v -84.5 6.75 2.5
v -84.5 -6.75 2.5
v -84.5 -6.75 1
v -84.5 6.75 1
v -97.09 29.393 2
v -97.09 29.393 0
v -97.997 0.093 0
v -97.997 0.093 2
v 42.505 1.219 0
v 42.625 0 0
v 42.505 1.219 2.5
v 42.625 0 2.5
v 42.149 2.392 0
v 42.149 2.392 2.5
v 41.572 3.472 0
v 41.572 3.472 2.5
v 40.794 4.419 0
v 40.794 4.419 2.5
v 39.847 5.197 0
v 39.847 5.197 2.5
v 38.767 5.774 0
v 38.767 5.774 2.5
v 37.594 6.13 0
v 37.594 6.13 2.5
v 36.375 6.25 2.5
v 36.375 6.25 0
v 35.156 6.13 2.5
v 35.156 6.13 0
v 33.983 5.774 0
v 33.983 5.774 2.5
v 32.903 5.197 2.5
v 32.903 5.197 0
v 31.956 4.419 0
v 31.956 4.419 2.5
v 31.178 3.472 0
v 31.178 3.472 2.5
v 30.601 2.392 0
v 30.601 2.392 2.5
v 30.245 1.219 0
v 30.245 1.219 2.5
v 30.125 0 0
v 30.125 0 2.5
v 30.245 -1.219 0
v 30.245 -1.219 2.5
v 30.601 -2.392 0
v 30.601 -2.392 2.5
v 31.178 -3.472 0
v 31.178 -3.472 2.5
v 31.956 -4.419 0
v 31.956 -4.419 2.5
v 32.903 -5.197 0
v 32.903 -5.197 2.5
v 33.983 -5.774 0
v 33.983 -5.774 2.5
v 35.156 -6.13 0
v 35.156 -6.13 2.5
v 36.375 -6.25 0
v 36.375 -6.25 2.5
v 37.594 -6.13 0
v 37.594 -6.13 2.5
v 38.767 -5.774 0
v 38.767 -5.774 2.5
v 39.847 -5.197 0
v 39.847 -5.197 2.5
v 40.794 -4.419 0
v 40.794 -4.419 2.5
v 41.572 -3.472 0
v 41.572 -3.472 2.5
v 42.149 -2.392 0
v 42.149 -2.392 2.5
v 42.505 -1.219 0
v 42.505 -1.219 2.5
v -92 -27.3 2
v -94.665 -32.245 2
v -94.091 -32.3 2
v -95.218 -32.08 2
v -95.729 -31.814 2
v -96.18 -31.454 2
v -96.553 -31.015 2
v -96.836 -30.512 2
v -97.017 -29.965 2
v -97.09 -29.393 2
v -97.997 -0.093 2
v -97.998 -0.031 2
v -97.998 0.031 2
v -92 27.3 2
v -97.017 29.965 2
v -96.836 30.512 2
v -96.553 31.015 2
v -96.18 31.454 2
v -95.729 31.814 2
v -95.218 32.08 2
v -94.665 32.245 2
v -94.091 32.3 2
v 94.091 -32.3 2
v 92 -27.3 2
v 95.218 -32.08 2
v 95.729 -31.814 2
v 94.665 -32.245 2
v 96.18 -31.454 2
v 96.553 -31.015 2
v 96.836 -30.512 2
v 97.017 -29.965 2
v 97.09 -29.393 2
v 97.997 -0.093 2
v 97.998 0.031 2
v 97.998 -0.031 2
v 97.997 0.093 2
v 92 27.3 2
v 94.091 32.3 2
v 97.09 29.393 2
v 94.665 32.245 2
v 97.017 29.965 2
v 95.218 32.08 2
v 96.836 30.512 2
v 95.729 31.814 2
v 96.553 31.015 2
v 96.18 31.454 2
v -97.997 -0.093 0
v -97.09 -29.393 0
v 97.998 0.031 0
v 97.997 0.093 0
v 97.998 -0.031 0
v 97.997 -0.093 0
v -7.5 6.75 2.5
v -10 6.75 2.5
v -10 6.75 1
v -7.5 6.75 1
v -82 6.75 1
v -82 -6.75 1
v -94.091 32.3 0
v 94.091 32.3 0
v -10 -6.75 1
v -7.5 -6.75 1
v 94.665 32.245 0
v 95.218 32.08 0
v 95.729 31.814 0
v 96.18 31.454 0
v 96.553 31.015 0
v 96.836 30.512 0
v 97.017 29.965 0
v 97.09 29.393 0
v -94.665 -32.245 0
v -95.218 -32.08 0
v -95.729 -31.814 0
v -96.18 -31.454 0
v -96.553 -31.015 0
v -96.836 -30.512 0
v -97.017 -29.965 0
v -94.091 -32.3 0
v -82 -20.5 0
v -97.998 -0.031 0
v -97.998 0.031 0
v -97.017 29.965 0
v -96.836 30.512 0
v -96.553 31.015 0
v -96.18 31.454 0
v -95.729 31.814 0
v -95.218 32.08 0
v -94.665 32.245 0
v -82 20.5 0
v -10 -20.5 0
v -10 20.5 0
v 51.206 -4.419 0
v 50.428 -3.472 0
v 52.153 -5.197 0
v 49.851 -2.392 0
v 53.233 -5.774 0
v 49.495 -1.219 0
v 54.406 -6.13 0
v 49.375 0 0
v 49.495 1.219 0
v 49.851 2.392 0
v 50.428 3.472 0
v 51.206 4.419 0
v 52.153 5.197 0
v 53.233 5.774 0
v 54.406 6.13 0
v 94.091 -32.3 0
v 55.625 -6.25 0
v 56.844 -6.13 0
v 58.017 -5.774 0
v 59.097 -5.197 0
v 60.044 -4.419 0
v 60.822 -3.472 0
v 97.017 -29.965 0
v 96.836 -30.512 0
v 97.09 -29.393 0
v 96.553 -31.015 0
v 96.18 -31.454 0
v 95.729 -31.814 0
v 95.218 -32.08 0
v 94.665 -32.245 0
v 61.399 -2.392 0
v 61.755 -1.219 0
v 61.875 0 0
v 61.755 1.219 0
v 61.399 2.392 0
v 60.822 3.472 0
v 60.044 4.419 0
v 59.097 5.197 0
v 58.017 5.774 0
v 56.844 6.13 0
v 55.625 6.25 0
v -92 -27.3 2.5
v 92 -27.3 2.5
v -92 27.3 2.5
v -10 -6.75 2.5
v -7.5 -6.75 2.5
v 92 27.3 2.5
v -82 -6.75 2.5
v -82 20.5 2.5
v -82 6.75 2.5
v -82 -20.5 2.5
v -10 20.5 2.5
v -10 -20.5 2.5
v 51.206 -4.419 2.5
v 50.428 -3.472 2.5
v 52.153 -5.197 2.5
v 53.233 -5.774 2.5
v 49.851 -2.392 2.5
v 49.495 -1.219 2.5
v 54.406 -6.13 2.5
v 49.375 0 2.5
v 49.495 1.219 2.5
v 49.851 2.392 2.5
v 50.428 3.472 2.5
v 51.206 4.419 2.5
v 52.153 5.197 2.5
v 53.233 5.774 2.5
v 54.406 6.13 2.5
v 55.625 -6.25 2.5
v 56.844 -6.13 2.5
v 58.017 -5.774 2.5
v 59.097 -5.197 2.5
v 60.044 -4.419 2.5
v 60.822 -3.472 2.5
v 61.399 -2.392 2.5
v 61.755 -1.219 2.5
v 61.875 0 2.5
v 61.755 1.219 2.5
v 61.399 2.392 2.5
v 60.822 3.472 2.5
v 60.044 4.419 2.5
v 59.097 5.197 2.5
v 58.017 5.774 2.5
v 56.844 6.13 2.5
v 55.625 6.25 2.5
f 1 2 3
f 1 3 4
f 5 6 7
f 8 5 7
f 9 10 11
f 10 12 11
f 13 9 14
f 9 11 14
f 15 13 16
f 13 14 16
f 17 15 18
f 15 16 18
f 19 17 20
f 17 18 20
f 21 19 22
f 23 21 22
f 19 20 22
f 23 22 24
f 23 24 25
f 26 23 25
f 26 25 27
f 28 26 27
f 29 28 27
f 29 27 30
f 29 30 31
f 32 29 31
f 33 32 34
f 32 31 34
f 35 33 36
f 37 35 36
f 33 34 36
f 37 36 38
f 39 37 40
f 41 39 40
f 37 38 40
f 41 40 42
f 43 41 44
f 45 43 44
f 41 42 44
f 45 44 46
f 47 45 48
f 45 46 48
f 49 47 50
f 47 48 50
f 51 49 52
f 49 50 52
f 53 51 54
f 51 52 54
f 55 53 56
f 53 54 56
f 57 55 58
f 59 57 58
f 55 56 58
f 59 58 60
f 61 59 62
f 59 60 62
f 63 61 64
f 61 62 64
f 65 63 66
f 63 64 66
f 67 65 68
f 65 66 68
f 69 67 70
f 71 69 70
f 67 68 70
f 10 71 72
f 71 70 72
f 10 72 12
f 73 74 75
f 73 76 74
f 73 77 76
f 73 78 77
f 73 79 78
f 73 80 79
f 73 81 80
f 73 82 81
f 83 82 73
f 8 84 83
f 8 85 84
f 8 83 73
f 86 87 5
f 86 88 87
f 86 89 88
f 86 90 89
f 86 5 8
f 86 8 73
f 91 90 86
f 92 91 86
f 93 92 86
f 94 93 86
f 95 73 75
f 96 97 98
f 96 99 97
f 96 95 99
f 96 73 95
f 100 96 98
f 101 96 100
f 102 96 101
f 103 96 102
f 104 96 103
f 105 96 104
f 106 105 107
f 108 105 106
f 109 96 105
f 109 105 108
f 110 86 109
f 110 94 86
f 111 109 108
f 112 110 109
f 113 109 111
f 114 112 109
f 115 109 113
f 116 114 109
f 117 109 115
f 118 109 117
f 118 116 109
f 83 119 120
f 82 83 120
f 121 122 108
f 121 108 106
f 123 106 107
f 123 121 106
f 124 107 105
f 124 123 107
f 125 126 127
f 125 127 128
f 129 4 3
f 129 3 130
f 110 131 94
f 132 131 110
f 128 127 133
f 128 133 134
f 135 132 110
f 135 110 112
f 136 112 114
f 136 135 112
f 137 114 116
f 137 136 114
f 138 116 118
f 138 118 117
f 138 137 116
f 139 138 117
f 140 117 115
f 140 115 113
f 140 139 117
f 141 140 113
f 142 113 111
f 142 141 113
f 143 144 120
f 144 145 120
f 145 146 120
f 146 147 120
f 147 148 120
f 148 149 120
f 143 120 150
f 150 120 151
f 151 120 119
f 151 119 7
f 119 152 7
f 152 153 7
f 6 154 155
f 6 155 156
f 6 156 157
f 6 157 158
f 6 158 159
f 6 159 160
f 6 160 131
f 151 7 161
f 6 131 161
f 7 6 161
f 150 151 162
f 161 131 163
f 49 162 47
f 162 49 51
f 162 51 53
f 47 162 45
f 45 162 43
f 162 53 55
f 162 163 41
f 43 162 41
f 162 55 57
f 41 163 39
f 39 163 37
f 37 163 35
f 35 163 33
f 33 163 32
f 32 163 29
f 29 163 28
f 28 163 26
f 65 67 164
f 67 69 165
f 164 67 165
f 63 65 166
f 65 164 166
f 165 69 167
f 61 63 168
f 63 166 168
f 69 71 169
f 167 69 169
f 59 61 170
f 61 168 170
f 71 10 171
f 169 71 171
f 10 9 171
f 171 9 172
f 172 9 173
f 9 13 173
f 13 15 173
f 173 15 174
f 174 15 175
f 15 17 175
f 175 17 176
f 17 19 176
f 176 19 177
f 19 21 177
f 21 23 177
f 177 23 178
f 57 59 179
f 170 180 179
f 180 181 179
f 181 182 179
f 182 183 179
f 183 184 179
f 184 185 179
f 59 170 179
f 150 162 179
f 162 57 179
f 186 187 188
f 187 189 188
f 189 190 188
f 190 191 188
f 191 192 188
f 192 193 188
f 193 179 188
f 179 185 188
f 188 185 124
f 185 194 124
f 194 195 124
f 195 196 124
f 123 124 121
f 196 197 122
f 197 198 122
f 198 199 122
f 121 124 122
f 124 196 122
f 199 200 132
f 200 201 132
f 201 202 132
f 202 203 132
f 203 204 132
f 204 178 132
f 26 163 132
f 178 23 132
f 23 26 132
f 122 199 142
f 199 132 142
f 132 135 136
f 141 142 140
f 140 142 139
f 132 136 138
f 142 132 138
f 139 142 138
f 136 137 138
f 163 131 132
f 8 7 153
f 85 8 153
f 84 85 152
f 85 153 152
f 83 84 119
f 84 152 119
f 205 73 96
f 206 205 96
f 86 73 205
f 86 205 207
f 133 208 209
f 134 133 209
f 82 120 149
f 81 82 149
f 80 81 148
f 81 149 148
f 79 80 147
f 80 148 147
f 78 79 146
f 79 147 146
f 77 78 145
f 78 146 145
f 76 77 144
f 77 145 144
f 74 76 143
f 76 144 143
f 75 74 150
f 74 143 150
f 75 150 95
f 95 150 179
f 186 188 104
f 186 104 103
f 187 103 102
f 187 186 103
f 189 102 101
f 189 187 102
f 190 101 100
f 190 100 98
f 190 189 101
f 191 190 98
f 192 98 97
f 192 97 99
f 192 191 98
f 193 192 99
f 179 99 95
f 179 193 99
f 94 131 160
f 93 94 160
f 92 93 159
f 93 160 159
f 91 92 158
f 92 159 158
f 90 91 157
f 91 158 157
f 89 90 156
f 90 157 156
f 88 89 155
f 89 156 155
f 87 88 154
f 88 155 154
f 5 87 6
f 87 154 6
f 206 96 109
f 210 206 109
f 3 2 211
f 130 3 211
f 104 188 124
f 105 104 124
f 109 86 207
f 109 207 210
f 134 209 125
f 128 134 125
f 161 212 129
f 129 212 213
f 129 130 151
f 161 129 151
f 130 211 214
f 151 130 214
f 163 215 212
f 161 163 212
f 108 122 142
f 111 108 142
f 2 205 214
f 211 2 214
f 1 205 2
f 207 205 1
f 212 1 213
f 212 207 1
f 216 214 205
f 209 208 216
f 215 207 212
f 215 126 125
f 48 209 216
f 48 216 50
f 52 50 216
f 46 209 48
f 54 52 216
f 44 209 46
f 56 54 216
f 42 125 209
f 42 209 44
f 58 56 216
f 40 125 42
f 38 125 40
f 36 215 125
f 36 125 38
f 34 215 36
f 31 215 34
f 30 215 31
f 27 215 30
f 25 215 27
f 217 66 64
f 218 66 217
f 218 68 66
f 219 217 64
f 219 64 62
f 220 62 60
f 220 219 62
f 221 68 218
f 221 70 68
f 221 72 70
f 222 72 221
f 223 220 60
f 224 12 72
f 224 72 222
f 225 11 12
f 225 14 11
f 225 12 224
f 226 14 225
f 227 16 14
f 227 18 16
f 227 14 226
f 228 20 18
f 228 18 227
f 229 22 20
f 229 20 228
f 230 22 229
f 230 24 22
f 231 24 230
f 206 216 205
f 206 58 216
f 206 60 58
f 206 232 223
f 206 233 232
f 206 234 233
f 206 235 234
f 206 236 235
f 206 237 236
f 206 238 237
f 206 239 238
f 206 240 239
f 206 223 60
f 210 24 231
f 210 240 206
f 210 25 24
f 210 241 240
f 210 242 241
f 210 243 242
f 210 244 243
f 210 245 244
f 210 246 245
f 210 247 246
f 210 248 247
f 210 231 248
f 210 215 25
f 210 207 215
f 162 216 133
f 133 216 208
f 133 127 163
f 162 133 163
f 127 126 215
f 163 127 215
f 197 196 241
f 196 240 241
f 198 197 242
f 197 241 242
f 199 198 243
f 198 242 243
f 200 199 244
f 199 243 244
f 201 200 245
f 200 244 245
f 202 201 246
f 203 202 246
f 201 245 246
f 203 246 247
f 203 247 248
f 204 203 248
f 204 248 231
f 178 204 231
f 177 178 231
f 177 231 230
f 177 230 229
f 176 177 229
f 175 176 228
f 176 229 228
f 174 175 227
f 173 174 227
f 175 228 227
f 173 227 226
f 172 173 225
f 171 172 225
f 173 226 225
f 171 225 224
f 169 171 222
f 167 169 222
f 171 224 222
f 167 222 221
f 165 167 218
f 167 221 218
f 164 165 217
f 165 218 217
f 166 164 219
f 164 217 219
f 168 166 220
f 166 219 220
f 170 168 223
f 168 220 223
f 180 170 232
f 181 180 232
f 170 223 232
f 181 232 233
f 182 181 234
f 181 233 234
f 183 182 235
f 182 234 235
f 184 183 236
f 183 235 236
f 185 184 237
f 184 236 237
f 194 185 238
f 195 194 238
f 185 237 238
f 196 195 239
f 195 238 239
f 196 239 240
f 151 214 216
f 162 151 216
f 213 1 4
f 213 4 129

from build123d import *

# Parameters (mm, degrees)
F0_W        = 194
F0_H        = 64.6
F1_DEPTH    = 2
F2_W        = 184
F2_H        = 54.6
F3_DEPTH    = 0.5
F4_R        = 6.25
F4_W        = 2.5
F4_H        = 13.5
F5_DEPTH    = 25
F6_T1_DEPTH = 16.5427907903
F6_T3_DEPTH = 2.4643962848
F7_DEPTH    = 1.5


# Not quite as in the source:
# - a fillet or chamfer that OpenCascade refuses, or shapes differently, is made with other operations: its cross-section is extruded or revolved along the edge and cut away or added


with BuildPart() as f1:
    # F0 (on Top) → F1 (new body)
    with BuildSketch(Plane.XY):
        Rectangle(F0_W, F0_H)
        Polygon((98, 0), (97, 32.3), (97, -32.3), align=None)
        Polygon((-97, -32.3), (-97, 32.3), (-98, 0), align=None)
    extrude(amount=F1_DEPTH)

    # F2 (on face) → F3 (join)
    with BuildSketch(Plane.XY.offset(2)):
        Rectangle(F2_W, F2_H)
    extrude(amount=F3_DEPTH)

    # F4 (on face) → F5 (cut)
    with BuildSketch(Plane.XY.offset(2.5)):
        Polygon((-10, 20.5), (-82, 20.5), (-82, 6.75), (-79.5, 6.75), (-79.5, -6.75), (-82, -6.75), (-82, -20.5), (-10, -20.5), (-10, -6.75), (-12.5, -6.75), (-12.5, 6.75), (-10, 6.75), align=None)
        with Locations((36.375, 0)):
            Circle(F4_R)
        with Locations((55.625, 0)):
            Circle(F4_R)
        with Locations((-11.25, 0)):
            Rectangle(F4_W, F4_H)
        with Locations((-80.75, 0)):
            Rectangle(F4_W, F4_H)
    extrude(amount=-F5_DEPTH, mode=Mode.SUBTRACT)

    # F6: fillet of radius 3 on 6 edges, made by hand

    # F6_s2 → F6_t1 (cut)
    with BuildSketch(Plane.XY.offset(-7.2713953952)):
        with BuildLine():
            ThreePointArc((97.0900051153, -29.3928347763), (96.1796822102, -31.4538923289), (94.0914418419, -32.3))
            Line((94.0914418419, -32.3), (97, -32.3))
            Line((97, -32.3), (97.0900051153, -29.3928347763))
        make_face()
        with BuildLine():
            ThreePointArc((94.0914418419, 32.3), (96.1796822102, 31.4538923289), (97.0900051153, 29.3928347763))
            Line((97.0900051153, 29.3928347763), (97, 32.3))
            Line((97, 32.3), (94.0914418419, 32.3))
        make_face()
        with BuildLine():
            ThreePointArc((-94.0914418419, 32.3), (-96.1796822102, 31.4538923289), (-97.0900051153, 29.3928347763))
            Line((-97.0900051153, 29.3928347763), (-97, 32.3))
            Line((-97, 32.3), (-94.0914418419, 32.3))
        make_face()
        with BuildLine():
            ThreePointArc((-97.0900051153, -29.3928347763), (-96.1796822102, -31.4538923289), (-94.0914418419, -32.3))
            Line((-94.0914418419, -32.3), (-97, -32.3))
            Line((-97, -32.3), (-97.0900051153, -29.3928347763))
        make_face()
    extrude(amount=F6_T1_DEPTH, mode=Mode.SUBTRACT)

    # F6_s4 → F6_t3 (cut)
    with BuildSketch(Plane.XY.offset(-0.2321981424)):
        with BuildLine():
            ThreePointArc((-97.9971258583, 0.0928347763), (-97.998562585, 0), (-97.9971258583, -0.0928347763))
            Line((-97.9971258583, -0.0928347763), (-98, 0))
            Line((-98, 0), (-97.9971258583, 0.0928347763))
        make_face()
        with BuildLine():
            ThreePointArc((97.9971258583, 0.0928347763), (97.998562585, 0), (97.9971258583, -0.0928347763))
            Line((97.9971258583, -0.0928347763), (98, 0))
            Line((98, 0), (97.9971258583, 0.0928347763))
        make_face()
    extrude(amount=F6_T3_DEPTH, mode=Mode.SUBTRACT)

    # F4 (on face) → F7 (cut)
    with BuildSketch(Plane.XY.offset(2.5)):
        Polygon((-10, 20.5), (-82, 20.5), (-82, 6.75), (-79.5, 6.75), (-79.5, -6.75), (-82, -6.75), (-82, -20.5), (-10, -20.5), (-10, -6.75), (-12.5, -6.75), (-12.5, 6.75), (-10, 6.75), align=None)
        with Locations((-80.75, 0)):
            Rectangle(F4_W, F4_H)
        with Locations((-83.25, 0)):
            Rectangle(F4_W, F4_H)
        with Locations((-8.75, 0)):
            Rectangle(F4_W, F4_H)
        with Locations((-11.25, 0)):
            Rectangle(F4_W, F4_H)
        with Locations((36.375, 0)):
            Circle(F4_R)
        with Locations((55.625, 0)):
            Circle(F4_R)
    extrude(amount=-F7_DEPTH, mode=Mode.SUBTRACT)


solid = f1.part
